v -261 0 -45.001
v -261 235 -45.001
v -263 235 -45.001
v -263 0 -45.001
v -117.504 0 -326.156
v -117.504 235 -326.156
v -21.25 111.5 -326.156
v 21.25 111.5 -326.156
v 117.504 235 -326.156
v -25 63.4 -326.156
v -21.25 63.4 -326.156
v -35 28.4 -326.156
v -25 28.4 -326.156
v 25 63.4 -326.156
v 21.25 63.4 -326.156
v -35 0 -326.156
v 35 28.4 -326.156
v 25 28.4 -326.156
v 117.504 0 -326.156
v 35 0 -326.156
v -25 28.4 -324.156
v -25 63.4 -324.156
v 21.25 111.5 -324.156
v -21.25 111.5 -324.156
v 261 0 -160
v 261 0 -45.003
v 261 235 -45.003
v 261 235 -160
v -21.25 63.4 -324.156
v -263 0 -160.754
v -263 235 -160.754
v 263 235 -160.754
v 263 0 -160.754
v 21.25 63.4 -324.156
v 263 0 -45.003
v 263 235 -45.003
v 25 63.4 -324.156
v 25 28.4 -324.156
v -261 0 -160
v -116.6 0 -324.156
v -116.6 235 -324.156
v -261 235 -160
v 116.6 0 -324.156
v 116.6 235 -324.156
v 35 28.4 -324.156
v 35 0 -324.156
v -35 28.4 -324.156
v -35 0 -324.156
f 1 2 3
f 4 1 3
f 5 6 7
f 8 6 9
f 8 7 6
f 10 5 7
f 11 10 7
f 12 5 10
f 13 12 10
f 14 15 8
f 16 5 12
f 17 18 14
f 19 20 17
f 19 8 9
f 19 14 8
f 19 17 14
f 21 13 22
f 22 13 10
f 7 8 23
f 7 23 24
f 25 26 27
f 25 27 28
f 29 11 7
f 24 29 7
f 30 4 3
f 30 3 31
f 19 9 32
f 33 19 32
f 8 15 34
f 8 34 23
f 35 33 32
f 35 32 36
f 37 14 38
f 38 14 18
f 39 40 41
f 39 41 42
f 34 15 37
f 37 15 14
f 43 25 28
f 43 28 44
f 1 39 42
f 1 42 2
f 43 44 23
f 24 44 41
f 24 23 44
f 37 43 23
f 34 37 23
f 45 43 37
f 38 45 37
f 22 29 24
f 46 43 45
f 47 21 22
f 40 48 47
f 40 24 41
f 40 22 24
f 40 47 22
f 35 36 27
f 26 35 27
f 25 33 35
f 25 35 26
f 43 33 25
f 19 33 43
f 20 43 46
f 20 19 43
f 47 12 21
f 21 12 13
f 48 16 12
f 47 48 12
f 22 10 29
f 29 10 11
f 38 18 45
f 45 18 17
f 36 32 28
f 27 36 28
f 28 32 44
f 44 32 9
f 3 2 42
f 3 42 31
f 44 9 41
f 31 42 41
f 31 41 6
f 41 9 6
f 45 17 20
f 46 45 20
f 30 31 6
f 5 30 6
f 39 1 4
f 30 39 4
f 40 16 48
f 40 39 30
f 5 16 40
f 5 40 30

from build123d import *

# Parameters (mm, degrees)
BOSS_EXTRUDE5_DEPTH = 234.9999999
SKETCH4_W           = 42.5
SKETCH4_H           = 48.09999997
CUT_EXTRUDE1_DEPTH  = 2.000000064


with BuildPart() as part:
    # Sketch1 → Boss-Extrude5 (new body)
    with BuildSketch(Plane(origin=(0, 0, 0), x_dir=(1, 0, 0), z_dir=(0, 1, 0))):
        Polygon((-117.504462868, 326.155640462), (117.504462868, 326.155640462), (263.000000064, 160.754471715), (263.000000064, 45.003453118), (261, 45.003453118), (261, 160), (116.600094822, 324.155640398), (-116.600094822, 324.155640398), (-261, 160), (-261, 45.001214275), (-263.000000064, 45.001214275), (-263.000000064, 160.754471715), align=None)
    extrude(amount=BOSS_EXTRUDE5_DEPTH)

    # Sketch4 → Cut-Extrude1 (cut)
    with BuildSketch(Plane(origin=(0, 0, -326.155640462), x_dir=(-1, 0, 0), z_dir=(0, 0, -1))):
        with Locations((0, 87.449999931)):
            Rectangle(SKETCH4_W, SKETCH4_H)
        Polygon((-25, 63.399999946), (-25, 28.4), (25, 28.4), (25, 63.399999946), (21.25, 63.399999946), (-21.25, 63.399999946), align=None)
        Polygon((-25, 28.4), (-35, 28.4), (-35, 0), (35, 0), (35, 28.4), (25, 28.4), align=None)
    extrude(amount=-CUT_EXTRUDE1_DEPTH, mode=Mode.SUBTRACT)


solid = part.part
